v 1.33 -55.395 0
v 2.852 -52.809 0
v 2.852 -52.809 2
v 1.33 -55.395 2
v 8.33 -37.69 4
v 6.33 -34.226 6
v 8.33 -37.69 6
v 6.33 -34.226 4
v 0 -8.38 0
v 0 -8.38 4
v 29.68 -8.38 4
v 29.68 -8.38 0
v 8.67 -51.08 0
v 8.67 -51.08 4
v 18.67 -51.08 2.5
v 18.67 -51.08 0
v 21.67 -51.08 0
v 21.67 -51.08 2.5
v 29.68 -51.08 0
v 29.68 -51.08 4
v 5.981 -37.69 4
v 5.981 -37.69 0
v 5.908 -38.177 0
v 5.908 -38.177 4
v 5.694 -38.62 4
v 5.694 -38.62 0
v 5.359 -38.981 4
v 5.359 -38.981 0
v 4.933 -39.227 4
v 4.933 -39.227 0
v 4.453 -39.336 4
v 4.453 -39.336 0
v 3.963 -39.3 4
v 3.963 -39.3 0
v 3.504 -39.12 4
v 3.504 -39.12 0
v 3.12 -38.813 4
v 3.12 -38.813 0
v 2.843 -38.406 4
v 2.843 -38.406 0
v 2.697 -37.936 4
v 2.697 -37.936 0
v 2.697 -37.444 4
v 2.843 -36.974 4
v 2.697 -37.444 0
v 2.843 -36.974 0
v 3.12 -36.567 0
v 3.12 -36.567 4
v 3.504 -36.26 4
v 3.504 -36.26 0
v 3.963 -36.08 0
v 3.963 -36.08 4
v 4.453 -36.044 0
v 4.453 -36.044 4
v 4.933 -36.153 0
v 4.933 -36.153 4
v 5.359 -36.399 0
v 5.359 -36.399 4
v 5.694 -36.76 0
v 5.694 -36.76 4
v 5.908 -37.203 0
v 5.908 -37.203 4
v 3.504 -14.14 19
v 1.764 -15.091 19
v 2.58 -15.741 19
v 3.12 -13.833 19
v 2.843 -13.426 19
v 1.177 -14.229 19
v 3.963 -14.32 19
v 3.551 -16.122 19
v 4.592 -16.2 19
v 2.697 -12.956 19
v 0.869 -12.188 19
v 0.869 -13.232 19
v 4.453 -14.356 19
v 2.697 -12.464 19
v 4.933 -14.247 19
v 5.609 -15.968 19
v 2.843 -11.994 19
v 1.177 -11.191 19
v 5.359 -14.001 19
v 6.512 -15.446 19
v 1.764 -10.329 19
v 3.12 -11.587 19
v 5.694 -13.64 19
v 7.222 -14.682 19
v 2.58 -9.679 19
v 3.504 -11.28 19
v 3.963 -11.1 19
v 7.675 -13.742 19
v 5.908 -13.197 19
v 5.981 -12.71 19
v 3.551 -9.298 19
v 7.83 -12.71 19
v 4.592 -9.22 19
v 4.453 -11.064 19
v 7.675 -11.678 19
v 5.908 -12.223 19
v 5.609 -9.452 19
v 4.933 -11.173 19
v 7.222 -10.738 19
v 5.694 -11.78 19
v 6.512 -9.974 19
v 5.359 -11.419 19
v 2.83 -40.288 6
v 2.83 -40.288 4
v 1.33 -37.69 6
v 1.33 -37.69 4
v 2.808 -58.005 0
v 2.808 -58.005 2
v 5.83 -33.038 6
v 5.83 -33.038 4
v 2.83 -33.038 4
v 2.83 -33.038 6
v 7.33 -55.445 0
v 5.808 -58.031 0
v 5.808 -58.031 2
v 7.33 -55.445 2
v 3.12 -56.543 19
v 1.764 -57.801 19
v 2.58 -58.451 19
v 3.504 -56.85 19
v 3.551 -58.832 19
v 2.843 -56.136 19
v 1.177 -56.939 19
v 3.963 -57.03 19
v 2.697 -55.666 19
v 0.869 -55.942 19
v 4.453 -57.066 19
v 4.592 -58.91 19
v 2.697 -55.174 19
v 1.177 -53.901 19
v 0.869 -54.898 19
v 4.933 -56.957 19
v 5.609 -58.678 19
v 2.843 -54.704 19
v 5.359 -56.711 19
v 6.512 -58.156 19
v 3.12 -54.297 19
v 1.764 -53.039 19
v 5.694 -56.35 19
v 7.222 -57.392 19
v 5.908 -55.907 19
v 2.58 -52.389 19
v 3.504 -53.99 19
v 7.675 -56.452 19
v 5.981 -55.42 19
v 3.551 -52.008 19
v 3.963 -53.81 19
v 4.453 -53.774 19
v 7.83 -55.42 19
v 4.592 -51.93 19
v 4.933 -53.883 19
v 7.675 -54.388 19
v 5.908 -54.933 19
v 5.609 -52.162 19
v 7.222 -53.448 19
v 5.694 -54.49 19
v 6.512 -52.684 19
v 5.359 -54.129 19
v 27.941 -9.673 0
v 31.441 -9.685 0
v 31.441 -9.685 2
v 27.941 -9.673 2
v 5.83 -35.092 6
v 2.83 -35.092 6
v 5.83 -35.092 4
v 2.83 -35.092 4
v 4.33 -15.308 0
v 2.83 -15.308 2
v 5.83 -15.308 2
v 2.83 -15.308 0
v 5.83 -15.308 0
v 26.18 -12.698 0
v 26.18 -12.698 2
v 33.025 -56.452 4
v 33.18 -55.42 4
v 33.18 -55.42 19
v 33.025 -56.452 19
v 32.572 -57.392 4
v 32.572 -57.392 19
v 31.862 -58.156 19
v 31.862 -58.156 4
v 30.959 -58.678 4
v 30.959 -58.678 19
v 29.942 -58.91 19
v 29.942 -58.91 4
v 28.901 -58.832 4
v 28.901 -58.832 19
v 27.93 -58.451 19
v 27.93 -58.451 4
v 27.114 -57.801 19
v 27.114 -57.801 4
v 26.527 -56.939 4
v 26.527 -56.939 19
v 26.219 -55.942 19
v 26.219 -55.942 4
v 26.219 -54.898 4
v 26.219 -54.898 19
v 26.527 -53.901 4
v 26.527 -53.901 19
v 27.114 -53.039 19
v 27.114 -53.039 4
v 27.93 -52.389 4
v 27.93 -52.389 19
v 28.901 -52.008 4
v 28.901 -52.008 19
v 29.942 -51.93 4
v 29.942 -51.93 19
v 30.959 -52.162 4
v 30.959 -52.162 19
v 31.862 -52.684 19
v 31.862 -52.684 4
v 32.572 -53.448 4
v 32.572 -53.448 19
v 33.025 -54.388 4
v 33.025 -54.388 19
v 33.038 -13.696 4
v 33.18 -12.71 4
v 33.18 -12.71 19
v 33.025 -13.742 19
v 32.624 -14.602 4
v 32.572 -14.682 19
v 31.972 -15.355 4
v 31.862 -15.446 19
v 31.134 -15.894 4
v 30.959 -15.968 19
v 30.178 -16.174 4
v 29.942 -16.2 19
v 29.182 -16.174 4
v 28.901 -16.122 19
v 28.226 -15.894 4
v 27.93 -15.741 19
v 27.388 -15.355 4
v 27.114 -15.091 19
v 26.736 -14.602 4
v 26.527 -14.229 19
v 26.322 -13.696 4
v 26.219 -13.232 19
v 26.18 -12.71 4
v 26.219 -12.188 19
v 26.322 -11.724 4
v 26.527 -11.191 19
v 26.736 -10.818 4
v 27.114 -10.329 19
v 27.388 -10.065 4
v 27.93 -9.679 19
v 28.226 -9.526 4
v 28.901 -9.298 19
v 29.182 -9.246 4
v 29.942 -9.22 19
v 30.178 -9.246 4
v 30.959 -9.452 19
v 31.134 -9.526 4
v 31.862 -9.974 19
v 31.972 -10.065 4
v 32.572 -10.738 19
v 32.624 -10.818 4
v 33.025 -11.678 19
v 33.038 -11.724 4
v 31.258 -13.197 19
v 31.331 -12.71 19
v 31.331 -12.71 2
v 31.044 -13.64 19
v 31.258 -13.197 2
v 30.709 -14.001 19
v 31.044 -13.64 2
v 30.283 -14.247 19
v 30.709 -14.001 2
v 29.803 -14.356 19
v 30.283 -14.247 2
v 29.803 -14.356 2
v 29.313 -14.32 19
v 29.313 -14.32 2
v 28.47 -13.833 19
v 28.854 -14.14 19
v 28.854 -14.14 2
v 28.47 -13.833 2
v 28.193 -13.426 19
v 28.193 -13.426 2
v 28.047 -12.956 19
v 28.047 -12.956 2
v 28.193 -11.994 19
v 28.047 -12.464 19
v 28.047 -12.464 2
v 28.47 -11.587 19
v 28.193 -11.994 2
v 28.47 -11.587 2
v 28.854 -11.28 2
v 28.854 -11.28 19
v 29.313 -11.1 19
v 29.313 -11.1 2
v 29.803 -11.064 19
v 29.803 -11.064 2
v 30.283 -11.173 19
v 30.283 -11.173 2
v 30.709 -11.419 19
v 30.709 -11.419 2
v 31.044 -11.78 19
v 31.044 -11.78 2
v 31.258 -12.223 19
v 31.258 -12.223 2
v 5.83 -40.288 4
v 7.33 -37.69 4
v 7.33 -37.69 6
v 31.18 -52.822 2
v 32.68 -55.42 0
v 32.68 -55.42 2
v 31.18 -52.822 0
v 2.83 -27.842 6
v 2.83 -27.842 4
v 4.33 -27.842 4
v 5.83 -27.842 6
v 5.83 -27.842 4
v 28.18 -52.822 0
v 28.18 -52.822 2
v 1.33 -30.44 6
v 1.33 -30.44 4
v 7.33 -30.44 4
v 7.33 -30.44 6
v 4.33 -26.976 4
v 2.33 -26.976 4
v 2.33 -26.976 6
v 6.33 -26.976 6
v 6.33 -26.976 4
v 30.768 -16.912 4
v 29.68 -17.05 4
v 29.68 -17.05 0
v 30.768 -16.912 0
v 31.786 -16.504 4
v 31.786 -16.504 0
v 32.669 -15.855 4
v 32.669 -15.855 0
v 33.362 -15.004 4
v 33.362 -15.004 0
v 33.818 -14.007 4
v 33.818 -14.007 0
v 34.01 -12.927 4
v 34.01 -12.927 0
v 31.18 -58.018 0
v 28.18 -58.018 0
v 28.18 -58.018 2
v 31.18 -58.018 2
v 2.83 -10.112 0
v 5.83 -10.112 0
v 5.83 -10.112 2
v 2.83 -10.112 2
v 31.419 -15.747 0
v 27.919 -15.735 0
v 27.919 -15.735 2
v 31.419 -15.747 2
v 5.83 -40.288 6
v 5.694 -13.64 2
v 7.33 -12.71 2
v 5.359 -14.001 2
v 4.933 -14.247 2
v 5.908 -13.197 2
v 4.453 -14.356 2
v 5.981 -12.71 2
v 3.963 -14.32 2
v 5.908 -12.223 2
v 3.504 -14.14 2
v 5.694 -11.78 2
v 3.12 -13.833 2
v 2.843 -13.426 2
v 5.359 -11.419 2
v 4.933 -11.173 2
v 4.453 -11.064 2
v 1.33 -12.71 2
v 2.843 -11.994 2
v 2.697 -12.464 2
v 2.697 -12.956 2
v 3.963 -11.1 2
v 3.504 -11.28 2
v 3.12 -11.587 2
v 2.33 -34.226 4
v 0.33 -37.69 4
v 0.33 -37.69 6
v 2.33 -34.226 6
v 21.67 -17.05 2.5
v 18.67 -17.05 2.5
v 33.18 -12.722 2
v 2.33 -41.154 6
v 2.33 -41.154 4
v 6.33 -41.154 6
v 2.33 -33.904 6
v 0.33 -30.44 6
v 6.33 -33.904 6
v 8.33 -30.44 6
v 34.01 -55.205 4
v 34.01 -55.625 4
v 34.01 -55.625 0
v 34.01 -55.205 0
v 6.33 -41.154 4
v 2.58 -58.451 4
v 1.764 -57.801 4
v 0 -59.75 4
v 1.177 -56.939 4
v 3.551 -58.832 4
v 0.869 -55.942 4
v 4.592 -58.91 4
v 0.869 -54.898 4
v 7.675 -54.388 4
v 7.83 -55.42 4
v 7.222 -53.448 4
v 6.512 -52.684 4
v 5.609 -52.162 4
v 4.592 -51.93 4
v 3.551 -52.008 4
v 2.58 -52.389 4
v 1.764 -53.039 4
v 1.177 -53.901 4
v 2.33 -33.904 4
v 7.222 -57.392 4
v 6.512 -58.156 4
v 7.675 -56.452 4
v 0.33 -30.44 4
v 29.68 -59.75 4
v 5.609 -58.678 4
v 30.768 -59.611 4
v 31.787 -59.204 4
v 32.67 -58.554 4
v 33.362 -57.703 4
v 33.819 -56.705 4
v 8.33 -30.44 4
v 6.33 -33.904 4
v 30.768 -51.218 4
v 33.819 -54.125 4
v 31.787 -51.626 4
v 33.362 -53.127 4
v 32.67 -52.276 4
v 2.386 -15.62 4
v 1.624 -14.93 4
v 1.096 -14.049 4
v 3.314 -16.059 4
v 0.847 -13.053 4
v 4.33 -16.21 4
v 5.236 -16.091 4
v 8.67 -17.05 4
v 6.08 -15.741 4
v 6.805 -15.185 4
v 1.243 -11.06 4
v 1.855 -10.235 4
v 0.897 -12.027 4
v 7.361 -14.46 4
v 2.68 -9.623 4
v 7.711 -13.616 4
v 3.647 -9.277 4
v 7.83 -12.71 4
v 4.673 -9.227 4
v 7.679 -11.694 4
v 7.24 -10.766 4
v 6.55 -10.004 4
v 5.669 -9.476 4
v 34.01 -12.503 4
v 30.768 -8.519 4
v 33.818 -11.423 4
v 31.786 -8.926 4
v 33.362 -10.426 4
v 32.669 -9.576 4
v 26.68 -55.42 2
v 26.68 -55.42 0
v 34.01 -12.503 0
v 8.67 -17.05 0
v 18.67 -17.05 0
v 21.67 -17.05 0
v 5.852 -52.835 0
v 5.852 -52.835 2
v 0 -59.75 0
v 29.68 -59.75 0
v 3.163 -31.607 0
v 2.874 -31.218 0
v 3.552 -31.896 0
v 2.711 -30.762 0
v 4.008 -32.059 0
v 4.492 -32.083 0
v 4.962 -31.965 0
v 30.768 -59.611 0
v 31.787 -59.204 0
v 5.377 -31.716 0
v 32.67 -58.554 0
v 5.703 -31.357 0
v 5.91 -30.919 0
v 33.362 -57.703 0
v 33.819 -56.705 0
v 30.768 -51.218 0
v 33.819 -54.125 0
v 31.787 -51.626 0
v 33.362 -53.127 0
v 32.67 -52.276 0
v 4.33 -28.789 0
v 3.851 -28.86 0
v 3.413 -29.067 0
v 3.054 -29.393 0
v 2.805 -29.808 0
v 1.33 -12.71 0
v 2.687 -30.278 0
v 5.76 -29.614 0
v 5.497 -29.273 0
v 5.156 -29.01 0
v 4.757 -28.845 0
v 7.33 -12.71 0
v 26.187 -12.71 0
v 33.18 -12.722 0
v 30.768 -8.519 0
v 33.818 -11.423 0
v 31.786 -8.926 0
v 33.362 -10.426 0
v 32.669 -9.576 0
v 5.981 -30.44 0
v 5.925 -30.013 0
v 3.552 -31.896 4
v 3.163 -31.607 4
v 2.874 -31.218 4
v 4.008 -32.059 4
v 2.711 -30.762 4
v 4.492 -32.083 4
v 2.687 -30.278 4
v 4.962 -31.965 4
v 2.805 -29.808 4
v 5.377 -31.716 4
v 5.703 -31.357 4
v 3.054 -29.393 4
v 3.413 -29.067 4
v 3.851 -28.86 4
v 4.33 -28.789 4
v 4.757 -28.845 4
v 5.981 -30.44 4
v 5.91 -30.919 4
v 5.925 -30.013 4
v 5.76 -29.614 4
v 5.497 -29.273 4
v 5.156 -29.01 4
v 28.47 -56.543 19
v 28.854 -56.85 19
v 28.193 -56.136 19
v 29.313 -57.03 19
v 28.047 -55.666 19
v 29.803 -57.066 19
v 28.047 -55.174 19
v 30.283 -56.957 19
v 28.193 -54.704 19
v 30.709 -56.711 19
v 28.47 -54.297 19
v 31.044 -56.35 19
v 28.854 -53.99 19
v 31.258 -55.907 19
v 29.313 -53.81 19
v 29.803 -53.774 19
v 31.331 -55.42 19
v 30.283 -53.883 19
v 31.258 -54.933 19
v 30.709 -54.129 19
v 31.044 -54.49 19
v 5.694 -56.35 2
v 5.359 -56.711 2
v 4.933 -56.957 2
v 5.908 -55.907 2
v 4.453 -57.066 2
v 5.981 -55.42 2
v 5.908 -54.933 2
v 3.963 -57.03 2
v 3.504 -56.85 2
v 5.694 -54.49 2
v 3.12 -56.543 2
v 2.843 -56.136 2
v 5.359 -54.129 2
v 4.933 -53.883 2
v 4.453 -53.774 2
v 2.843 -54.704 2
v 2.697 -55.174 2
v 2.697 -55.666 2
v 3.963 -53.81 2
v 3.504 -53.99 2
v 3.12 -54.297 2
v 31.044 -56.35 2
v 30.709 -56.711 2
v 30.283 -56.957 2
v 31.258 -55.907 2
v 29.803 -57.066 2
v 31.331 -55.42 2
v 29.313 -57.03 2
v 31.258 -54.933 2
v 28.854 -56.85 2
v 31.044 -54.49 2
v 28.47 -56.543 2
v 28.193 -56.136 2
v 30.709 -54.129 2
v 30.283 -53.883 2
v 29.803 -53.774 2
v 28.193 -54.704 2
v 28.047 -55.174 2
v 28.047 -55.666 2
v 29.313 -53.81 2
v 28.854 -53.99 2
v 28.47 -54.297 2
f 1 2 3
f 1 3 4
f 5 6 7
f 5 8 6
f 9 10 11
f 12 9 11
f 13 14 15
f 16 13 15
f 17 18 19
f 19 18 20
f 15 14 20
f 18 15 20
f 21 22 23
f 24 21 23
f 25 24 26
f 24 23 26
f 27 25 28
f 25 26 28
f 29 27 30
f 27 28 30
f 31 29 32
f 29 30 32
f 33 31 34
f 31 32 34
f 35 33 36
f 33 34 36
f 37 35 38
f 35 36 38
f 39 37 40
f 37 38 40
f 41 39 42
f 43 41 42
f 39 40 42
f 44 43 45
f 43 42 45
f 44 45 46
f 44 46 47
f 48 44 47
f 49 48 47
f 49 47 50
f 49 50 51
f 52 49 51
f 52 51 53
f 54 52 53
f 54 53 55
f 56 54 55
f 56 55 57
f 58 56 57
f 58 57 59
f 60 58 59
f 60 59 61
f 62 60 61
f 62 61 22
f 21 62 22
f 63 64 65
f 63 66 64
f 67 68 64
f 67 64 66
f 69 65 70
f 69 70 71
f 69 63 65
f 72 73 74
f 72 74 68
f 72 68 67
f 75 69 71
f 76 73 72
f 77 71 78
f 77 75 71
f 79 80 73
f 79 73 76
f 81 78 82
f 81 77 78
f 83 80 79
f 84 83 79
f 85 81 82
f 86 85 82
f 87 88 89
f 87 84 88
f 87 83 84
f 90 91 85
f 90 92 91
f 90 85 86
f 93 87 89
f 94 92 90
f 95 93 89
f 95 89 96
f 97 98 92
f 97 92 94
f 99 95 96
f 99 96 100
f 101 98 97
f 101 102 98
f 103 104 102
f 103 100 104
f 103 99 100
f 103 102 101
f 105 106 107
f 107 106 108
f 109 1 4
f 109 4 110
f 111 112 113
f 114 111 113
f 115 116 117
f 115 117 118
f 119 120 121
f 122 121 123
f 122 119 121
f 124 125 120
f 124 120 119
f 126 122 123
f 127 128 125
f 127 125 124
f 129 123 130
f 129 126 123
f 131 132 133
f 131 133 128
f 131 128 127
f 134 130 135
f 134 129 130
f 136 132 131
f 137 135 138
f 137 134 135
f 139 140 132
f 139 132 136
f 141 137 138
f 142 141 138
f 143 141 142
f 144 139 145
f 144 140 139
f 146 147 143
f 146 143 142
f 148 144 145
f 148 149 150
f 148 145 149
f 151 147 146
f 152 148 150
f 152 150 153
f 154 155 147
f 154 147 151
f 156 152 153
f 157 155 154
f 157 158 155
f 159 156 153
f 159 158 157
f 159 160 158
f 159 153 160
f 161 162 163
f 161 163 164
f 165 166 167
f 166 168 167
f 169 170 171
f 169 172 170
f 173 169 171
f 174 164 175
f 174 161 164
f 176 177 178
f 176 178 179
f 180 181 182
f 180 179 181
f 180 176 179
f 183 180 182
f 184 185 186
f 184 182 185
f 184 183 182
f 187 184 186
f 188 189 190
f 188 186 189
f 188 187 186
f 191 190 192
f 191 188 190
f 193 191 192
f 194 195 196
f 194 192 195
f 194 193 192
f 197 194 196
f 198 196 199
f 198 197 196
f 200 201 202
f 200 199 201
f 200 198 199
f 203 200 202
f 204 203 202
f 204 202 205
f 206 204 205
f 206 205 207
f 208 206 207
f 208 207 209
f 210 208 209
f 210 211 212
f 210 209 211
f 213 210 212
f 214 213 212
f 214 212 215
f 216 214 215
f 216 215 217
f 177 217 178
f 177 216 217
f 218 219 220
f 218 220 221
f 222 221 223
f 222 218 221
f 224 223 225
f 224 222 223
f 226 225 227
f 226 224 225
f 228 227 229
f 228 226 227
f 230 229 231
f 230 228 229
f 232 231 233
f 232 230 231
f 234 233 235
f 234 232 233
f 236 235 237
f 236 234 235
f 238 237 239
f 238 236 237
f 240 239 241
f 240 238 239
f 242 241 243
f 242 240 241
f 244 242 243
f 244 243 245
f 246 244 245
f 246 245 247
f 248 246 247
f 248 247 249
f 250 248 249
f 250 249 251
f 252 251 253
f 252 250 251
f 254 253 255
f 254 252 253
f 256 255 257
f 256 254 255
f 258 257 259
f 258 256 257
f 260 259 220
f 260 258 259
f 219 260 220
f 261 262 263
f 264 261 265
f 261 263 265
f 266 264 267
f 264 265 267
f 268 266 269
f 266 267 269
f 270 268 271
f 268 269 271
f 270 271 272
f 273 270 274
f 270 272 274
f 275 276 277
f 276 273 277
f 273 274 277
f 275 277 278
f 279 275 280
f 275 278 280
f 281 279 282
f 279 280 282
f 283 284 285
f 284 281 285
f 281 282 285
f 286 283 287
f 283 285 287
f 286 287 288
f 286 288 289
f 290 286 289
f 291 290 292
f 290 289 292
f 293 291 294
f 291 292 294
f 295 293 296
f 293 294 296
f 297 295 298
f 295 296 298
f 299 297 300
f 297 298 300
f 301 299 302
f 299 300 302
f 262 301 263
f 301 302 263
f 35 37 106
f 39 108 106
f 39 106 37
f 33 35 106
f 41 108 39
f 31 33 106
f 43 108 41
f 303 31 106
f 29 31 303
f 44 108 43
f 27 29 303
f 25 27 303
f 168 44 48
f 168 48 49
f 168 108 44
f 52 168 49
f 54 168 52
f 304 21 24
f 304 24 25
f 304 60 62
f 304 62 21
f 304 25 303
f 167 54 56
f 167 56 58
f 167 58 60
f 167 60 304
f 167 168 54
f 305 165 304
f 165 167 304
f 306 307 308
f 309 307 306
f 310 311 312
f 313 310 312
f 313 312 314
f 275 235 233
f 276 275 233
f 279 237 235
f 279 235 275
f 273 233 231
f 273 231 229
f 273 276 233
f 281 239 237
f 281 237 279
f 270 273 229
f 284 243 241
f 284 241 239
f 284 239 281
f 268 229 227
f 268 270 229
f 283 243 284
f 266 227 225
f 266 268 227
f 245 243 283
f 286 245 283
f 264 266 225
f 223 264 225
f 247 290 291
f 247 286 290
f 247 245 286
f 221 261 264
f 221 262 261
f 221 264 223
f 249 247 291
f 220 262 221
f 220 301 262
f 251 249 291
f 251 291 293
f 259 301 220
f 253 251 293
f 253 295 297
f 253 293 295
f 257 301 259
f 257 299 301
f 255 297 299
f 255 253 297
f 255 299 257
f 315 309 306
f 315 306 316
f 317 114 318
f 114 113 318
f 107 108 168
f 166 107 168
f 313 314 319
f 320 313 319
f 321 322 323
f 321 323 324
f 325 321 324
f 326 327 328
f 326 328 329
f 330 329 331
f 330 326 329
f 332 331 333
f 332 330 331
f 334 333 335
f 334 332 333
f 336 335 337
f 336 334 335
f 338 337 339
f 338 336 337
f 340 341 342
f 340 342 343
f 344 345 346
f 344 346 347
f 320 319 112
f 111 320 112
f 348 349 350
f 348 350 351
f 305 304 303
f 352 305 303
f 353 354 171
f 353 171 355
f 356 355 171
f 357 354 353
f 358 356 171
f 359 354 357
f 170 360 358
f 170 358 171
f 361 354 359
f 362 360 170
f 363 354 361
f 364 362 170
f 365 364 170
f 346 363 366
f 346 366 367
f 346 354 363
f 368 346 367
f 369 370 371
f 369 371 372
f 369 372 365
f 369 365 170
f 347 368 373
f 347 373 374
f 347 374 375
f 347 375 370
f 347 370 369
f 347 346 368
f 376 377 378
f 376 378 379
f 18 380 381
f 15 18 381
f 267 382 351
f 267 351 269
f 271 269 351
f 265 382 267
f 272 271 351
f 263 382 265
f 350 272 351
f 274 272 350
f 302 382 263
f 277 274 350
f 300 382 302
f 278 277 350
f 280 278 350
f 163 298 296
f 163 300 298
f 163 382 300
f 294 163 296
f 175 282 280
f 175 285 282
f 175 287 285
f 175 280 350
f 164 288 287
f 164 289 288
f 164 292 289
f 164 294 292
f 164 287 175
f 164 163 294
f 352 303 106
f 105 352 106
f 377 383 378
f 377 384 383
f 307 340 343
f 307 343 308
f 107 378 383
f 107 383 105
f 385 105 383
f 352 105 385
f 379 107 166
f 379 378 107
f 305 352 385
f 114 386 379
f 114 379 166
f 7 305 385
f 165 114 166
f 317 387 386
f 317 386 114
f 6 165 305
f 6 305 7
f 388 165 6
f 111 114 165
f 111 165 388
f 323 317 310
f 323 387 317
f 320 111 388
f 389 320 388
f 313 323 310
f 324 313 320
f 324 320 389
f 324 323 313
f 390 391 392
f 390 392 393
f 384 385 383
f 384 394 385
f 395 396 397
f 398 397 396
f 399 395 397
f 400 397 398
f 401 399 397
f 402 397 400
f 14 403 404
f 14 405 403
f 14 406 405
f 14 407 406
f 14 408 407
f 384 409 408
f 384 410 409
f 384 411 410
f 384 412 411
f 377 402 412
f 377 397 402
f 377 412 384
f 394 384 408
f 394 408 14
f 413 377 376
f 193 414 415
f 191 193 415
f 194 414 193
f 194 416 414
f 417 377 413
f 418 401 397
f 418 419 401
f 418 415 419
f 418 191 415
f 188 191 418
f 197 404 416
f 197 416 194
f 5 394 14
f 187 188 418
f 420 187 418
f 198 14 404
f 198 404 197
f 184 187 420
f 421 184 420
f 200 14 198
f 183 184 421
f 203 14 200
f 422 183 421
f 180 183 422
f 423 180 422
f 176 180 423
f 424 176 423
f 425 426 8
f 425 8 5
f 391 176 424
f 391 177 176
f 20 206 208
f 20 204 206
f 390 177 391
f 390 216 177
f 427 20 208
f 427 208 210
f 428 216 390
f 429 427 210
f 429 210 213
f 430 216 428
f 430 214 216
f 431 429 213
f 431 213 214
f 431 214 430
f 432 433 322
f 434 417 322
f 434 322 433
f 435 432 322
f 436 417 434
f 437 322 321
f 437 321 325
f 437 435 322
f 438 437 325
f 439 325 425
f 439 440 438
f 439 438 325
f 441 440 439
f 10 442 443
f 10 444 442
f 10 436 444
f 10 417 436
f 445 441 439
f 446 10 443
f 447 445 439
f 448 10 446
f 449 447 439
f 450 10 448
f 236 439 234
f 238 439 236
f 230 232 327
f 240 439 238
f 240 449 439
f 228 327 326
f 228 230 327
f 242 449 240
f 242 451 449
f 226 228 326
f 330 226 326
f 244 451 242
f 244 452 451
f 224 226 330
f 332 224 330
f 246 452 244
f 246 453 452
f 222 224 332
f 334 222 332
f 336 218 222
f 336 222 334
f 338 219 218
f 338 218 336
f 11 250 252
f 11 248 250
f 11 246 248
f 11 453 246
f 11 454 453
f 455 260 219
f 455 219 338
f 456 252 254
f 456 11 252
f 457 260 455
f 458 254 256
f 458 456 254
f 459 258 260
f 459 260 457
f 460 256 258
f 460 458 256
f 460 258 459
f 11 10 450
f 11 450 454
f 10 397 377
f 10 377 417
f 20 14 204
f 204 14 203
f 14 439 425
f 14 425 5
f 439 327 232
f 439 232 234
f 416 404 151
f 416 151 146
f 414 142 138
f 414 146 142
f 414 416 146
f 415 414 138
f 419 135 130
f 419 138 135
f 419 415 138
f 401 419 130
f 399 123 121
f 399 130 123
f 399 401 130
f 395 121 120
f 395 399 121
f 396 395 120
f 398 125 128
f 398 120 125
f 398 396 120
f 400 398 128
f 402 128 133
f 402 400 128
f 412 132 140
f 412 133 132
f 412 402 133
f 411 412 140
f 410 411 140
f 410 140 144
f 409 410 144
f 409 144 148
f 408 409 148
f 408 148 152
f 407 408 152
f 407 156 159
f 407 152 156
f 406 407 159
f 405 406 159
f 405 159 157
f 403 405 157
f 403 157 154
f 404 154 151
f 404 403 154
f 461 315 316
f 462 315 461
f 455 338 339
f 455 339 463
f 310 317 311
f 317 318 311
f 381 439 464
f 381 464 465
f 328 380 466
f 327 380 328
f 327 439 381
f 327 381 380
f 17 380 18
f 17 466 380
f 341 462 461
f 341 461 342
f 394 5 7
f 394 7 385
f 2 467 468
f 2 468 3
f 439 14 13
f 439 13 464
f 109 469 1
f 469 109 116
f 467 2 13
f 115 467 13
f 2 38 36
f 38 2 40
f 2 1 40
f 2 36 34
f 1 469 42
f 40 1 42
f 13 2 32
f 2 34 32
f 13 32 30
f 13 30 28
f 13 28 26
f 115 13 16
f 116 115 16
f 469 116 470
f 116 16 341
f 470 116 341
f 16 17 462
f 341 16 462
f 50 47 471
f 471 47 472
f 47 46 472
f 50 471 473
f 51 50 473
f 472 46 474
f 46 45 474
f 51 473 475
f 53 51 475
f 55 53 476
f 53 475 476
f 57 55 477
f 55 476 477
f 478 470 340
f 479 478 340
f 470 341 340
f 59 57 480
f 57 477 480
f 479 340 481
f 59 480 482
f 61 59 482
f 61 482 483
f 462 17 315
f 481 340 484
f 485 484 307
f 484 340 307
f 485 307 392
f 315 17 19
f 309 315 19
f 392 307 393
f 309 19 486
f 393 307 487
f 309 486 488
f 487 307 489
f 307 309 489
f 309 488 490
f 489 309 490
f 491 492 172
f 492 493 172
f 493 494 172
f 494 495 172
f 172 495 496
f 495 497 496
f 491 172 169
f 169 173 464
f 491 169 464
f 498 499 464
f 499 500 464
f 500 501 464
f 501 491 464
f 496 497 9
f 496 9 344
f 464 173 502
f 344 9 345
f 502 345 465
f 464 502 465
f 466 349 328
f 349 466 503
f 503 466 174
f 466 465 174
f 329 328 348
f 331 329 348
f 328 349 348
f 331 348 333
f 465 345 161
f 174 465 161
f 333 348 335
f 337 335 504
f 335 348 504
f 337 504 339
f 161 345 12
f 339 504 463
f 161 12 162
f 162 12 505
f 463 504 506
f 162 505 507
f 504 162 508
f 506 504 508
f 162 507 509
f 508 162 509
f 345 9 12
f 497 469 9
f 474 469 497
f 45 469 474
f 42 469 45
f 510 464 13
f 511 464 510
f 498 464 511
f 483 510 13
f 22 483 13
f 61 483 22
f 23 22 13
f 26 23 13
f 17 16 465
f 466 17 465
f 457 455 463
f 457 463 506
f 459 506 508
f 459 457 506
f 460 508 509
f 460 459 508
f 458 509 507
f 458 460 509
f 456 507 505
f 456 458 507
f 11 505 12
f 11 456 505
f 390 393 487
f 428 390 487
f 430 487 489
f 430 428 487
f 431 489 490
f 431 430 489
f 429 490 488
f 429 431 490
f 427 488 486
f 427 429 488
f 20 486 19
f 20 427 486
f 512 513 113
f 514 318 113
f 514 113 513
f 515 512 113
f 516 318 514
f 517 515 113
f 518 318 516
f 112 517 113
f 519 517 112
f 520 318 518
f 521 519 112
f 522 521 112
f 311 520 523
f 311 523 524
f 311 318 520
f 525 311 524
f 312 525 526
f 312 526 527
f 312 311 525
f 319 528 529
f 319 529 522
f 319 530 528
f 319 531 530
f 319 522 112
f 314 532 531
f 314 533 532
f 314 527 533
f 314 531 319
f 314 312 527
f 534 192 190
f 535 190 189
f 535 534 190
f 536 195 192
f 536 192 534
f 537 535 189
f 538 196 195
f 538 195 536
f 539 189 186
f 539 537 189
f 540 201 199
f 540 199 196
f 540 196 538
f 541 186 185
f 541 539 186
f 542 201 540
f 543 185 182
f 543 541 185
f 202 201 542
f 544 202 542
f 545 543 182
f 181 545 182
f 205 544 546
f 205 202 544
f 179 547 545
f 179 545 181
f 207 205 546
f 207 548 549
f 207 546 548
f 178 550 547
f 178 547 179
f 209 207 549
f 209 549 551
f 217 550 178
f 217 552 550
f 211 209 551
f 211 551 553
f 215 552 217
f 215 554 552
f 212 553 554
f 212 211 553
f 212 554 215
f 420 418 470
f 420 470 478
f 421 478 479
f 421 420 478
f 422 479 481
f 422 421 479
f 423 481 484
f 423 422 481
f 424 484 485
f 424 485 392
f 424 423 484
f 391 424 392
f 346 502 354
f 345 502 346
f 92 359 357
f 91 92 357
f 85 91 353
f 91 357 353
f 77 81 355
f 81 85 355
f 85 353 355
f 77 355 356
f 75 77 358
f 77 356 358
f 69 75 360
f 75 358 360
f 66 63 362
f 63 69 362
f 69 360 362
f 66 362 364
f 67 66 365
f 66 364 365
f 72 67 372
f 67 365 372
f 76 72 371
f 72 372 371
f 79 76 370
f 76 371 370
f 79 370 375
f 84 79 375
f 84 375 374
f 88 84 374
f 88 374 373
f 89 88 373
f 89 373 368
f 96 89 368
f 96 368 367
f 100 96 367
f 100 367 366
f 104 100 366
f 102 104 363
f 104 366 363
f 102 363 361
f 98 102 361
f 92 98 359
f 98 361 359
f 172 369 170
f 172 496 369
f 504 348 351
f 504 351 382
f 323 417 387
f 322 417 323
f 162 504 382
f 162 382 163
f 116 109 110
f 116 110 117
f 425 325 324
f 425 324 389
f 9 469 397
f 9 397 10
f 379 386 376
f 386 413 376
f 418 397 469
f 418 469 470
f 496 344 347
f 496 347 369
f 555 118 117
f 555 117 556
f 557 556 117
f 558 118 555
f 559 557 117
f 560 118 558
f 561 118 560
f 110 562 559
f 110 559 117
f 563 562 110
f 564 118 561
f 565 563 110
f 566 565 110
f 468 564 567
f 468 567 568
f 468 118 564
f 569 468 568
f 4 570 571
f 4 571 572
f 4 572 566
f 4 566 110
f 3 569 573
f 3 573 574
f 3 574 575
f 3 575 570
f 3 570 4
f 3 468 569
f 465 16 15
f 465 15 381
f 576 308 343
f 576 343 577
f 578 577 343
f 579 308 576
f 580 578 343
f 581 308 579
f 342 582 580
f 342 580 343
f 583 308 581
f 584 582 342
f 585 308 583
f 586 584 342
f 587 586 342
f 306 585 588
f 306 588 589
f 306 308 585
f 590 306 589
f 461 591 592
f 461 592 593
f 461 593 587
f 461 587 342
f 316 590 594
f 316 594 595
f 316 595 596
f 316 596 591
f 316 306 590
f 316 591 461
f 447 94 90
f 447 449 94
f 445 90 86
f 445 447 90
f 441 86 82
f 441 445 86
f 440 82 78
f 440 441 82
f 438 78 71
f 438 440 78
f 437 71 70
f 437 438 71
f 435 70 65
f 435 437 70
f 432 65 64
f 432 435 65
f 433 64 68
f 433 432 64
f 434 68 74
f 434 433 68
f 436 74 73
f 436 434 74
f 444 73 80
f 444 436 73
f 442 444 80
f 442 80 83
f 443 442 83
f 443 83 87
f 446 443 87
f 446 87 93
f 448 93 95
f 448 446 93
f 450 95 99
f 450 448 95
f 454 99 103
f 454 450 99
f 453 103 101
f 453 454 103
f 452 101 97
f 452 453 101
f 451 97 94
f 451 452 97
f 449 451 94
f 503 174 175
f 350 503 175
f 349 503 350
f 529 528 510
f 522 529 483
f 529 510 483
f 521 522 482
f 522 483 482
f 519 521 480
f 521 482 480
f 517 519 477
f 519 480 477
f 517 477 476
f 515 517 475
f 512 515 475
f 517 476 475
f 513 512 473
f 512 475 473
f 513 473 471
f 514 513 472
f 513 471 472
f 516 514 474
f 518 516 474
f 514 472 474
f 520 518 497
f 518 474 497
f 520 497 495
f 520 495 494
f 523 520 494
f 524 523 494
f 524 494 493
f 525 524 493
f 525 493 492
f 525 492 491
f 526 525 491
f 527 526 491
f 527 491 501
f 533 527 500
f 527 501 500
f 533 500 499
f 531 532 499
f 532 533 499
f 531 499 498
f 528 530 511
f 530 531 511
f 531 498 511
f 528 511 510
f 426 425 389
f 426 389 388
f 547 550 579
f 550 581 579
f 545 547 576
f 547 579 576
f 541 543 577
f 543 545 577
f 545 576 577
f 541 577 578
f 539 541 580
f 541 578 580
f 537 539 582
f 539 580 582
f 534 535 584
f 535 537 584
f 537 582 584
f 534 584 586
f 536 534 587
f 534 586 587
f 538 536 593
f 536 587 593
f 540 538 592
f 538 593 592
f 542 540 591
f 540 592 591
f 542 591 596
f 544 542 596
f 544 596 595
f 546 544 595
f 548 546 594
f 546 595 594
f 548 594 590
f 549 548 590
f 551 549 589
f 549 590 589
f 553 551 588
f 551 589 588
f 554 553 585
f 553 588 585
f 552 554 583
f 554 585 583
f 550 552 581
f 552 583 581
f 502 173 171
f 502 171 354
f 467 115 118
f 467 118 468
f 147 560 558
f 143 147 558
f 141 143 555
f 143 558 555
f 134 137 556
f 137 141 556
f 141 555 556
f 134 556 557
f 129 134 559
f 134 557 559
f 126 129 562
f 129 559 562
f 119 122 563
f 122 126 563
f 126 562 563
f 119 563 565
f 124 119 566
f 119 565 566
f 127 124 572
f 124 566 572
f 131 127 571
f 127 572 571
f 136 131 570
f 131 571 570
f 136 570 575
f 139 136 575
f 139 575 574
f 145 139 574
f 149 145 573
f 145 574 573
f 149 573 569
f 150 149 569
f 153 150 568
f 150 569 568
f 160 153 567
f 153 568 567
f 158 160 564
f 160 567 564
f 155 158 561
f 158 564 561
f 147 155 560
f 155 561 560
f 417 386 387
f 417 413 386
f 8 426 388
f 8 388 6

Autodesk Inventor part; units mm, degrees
ref_plane "YZ Plane" through (0, 0, 0) normal (1, 0, 0) x (0, 1, 0)
ref_plane "XZ Plane" through (0, 0, 0) normal (0, 1, 0) x (-1, 0, 0)
ref_plane "XY Plane" through (0, 0, 0) normal (0, 0, 1) x (1, 0, 0)
sketch "Sketch1" plane through (0, 0, 0) normal (0, 0, 1) x (1, 0, 0)
  line L0 (0, 0) -> (41.5, 0)
  line L1 (41.5, 0) -> (41.5, -73)
  line L2 (41.5, -73) -> (0, -73)
  line L3 (0, -73) -> (0, 0)
  line L4 (0, -73) -> (3.11, -73)
  line L5 (0, -73) -> (3.11, -73) construction
  line L6 (3.11, -73) -> (3.11, -69.85)
  line L7 (3.11, -73) -> (6.26, -73) construction
  line L8 (3.11, -69.85) -> (14.54, -69.85)
  line L9 (14.54, -69.85) -> (19.65, -69.85)
  line L10 (19.65, -69.85) -> (31.08, -69.85)
  circle A0 centre (3.11, -69.85) radius 1.6
  circle A1 centre (14.54, -69.85) radius 1.6
  circle A2 centre (19.65, -69.85) radius 1.6
  circle A3 centre (31.08, -69.85) radius 1.6
  line L11 (3.11, -69.85) -> (3.11, -55.42)
  line L12 (3.11, -69.85) -> (17.54, -69.85) construction
  line L13 (0, -73) -> (4.33, -73)
  line L14 (0, -73) -> (4.33, -73) construction
  line L15 (4.33, -73) -> (4.33, -53.49)
  line L16 (3.11, -55.42) -> (6.6479, -55.42)
  circle A4 centre (4.33, -55.42) radius 1.651
  line L17 (4.33, -55.42) -> (4.33, -37.69)
  line L18 (4.33, -55.42) -> (22.06, -55.42) construction
  line L19 (4.33, -55.42) -> (29.68, -55.42)
  line L20 (4.33, -55.42) -> (29.68, -55.42) construction
  circle A5 centre (4.33, -37.69) radius 1.651
  circle A6 centre (29.68, -55.42) radius 1.651
  line L21 (4.33, -37.69) -> (39.0376, -37.69)
  line L22 (29.68, -55.42) -> (29.68, -25.3245)
  circle A7 centre (29.68, -37.69) radius 1.651
  line L23 (4.33, -37.69) -> (4.33, -30.44)
  line L24 (4.33, -37.69) -> (11.58, -37.69) construction
  line L25 (4.33, -30.44) -> (4.33, -12.71)
  line L26 (4.33, -30.44) -> (29.68, -30.44)
  line L27 (4.33, -30.44) -> (29.68, -30.44) construction
  line L28 (4.33, -12.71) -> (29.68, -12.71)
  circle A8 centre (29.68, -12.71) radius 1.651
  circle A9 centre (4.33, -12.71) radius 1.651
  circle A10 centre (4.33, -30.44) radius 1.651
  circle A11 centre (29.68, -30.44) radius 1.651
  line L29 (29.68, -12.71) -> (29.68, -11.3536)
  dimension "d0" = 41.5
  dimension "d1" = 73
  dimension "d2" = 3.11
  dimension "d3" = 0
  dimension "d4" = 3.15
  dimension "d5" = 90
  dimension "d6" = 11.43
  dimension "d7" = 90
  dimension "d9" = 5.11
  dimension "d10" = 11.43
  dimension "d11" = 180
  dimension "d12" = 3.2
  dimension "d13" = 3.2
  dimension "d14" = 3.2
  dimension "d15" = 3.2
  dimension "d18" = 14.43
  dimension "d19" = 90
  dimension "d20" = 4.33
  dimension "d21" = 0
  dimension "d22" = 3.302
  dimension "d23" = 17.73
  dimension "d24" = 90
  dimension "d25" = 25.35
  dimension "d26" = 0
  dimension "d27" = 3.302
  dimension "d28" = 3.302
  dimension "d29" = 3.302
  dimension "d30" = 7.25
  dimension "d31" = 90
  dimension "d32" = 17.73
  dimension "d33" = 180
  dimension "d34" = 25.35
  dimension "d35" = 0
  dimension "d36" = 25.35
  dimension "d37" = 3.302
  dimension "d38" = 3.302
  dimension "d39" = 3.302
  dimension "d40" = 3.302
extrude "Extrusion2" add sketch "Sketch1" along normal blind 4 contours L0 L1 L2 L15 A0 A4 L16 L19 A6 L22 A7 A11 L26 A10 L23 A5 L17 L11 L6 L3 | L6 A0 L15 L2 | L11 A4 L15 A0 | L15 L17 A5 L21 A7 L22 A6 L19 L16 A4 | L23 A10 L26 A11 L22 A7 L21 A5
sketch "Sketch3" plane through (0, 0, 4) normal (0, 0, 1) x (1, 0, 0)
  circle A0 centre (4.33, -55.42) radius 1.651 projected
  circle A1 centre (4.33, -55.42) radius 3.5
  circle A2 centre (29.68, -55.42) radius 1.651 projected
  circle A3 centre (29.68, -55.42) radius 3.5
  circle A4 centre (4.33, -12.71) radius 1.651 projected
  circle A5 centre (4.33, -12.71) radius 3.5
  circle A6 centre (29.68, -12.71) radius 1.651 projected
  circle A7 centre (29.68, -12.71) radius 3.5
  point P0 (0, 0)
  dimension "d46" = 7
  dimension "d47" = 7
  dimension "d48" = 7
  dimension "d49" = 7
extrude "Extrusion4" add sketch "Sketch3" along normal blind 15
sketch "Sketch8" plane through (0, 0, 0) normal (0, 0, -1) x (-1, 0, 0)
  circle A0 centre (-4.33, -12.71) radius 1.651 projected
  circle A1 centre (-4.33, -12.71) radius 3
  circle A2 centre (-29.68, -12.71) radius 1.651 projected
  circle A3 centre (-29.68, -12.71) radius 3
  circle A4 centre (-29.68, -55.42) radius 1.651 projected
  circle A5 centre (-29.68, -55.42) radius 3
  circle A6 centre (-4.33, -55.42) radius 1.651 projected
  circle A7 centre (-4.33, -55.42) radius 3
  line L0 (-1.33, -12.71) -> (-2.83, -15.3081)
  line L1 (-2.83, -15.3081) -> (-5.83, -15.3081)
  line L2 (-5.83, -15.3081) -> (-7.33, -12.71)
  line L3 (-7.33, -12.71) -> (-5.83, -10.1119)
  line L4 (-5.83, -10.1119) -> (-2.83, -10.1119)
  line L5 (-2.83, -10.1119) -> (-1.33, -12.71)
  circle A8 centre (-29.68, -12.71) radius 3.5 projected
  line L6 (-26.18, -12.6978) -> (-27.9194, -15.735)
  line L7 (-27.9194, -15.735) -> (-31.4194, -15.7472)
  line L8 (-31.4194, -15.7472) -> (-33.18, -12.7222)
  line L9 (-33.18, -12.7222) -> (-31.4406, -9.685)
  line L10 (-31.4406, -9.685) -> (-27.9406, -9.6728)
  line L11 (-27.9406, -9.6728) -> (-26.18, -12.6978)
  line L12 (-26.68, -55.42) -> (-28.18, -58.0181)
  line L13 (-28.18, -58.0181) -> (-31.18, -58.0181)
  line L14 (-31.18, -58.0181) -> (-32.68, -55.42)
  line L15 (-32.68, -55.42) -> (-31.18, -52.8219)
  line L16 (-31.18, -52.8219) -> (-28.18, -52.8219)
  line L17 (-28.18, -52.8219) -> (-26.68, -55.42)
  line L18 (-1.3301, -55.3946) -> (-2.808, -58.0053)
  line L19 (-2.808, -58.0053) -> (-5.8079, -58.0307)
  line L20 (-5.8079, -58.0307) -> (-7.3299, -55.4454)
  line L21 (-7.3299, -55.4454) -> (-5.852, -52.8347)
  line L22 (-5.852, -52.8347) -> (-2.8521, -52.8093)
  line L23 (-2.8521, -52.8093) -> (-1.3301, -55.3946)
  point P0 (0, 0)
  dimension "d53" = 6
  dimension "d55" = 6
  dimension "d56" = 6
  dimension "d54" = 6
extrude "Extrusion5" cut sketch "Sketch8" against normal blind 2 contours L0 L1 L2 L3 L4 L5 | A2 | A3 | L12 L13 L14 L15 L16 L17 | L18 L19 L20 L21 L22 L23 | L6 L7 L8 L9 L10 L11
sketch "Sketch9" plane through (0, 0, 4) normal (0, 0, 1) x (1, 0, 0)
  circle A0 centre (4.33, -30.44) radius 1.651 projected
  circle A1 centre (4.33, -30.44) radius 1.651
  circle A2 centre (4.33, -37.69) radius 1.651 projected
  circle A3 centre (4.33, -37.69) radius 1.651
  line L0 (7.33, -30.44) -> (5.83, -33.0381)
  line L1 (5.83, -33.0381) -> (2.83, -33.0381)
  line L2 (2.83, -33.0381) -> (1.33, -30.44)
  line L3 (1.33, -30.44) -> (2.83, -27.8419)
  line L4 (2.83, -27.8419) -> (5.83, -27.8419)
  line L5 (5.83, -27.8419) -> (7.33, -30.44)
  line L6 (7.33, -37.69) -> (5.83, -40.2881)
  line L7 (5.83, -40.2881) -> (2.83, -40.2881)
  line L8 (2.83, -40.2881) -> (1.33, -37.69)
  line L9 (1.33, -37.69) -> (2.83, -35.0919)
  line L10 (2.83, -35.0919) -> (5.83, -35.0919)
  line L11 (5.83, -35.0919) -> (7.33, -37.69)
  line L12 (8.33, -30.44) -> (6.33, -33.9041)
  line L13 (6.33, -33.9041) -> (2.33, -33.9041)
  line L14 (2.33, -33.9041) -> (0.33, -30.44)
  line L15 (0.33, -30.44) -> (2.33, -26.9759)
  line L16 (2.33, -26.9759) -> (6.33, -26.9759)
  line L17 (6.33, -26.9759) -> (8.33, -30.44)
  line L18 (8.33, -37.69) -> (6.33, -41.1541)
  line L19 (6.33, -41.1541) -> (2.33, -41.1541)
  line L20 (2.33, -41.1541) -> (0.33, -37.69)
  line L21 (0.33, -37.69) -> (2.33, -34.2259)
  line L22 (2.33, -34.2259) -> (6.33, -34.2259)
  line L23 (6.33, -34.2259) -> (8.33, -37.69)
  line L24 (6.33, -33.9041) -> (6.33, -34.2259)
  line L25 (2.33, -33.9041) -> (2.33, -34.2259)
  point P0 (0, 0)
  dimension "d59" = 3.302
  dimension "d60" = 3.302
extrude "Extrusion6" add sketch "Sketch9" along normal blind 2 contours L12 L13 L14 L15 L16 L17 | L24 L22 L25 L13 | L23 L18 L19 L20 L21 L22
sketch "Sketch10" plane through (0, 0, 0) normal (0, 0, -1) x (-1, 0, 0)
  circle A0 centre (-4.33, -55.42) radius 1.651 projected
  circle A1 centre (-4.33, -12.71) radius 3.5 projected
  circle A2 centre (-4.33, -12.71) radius 4.33
  line L0 (-4.33, -8.38) -> (6.0992, -8.38)
  line L1 (-4.33, -8.38) -> (-46.273, -8.38)
  circle A3 centre (-29.68, -55.42) radius 1.651 projected
  circle A4 centre (-29.68, -12.71) radius 1.651 projected
  circle A5 centre (-29.68, -12.71) radius 4.33
  line L2 (-34.01, -12.71) -> (-34.01, 23.2585)
  circle A6 centre (-4.33, -55.42) radius 4.33
  line L3 (-34.01, -12.71) -> (-34.01, -66.3278)
  line L4 (-4.33, -59.75) -> (-38.3543, -59.75)
  circle A7 centre (-29.68, -55.42) radius 4.33
  line L5 (-29.68, -55.42) -> (-29.68, -12.71)
  circle A8 centre (-4.33, -12.71) radius 1.651 projected
  line L6 (-4.33, -12.71) -> (-29.68, -12.71)
  line L7 (-18.2288, -59.75) -> (-46.273, -59.75)
  line L8 (-46.273, -59.75) -> (-46.273, -78.0952)
  line L9 (-46.273, -78.0952) -> (-18.2288, -78.0952)
  line L10 (-18.2288, -78.0952) -> (-18.2288, -59.75)
  line L11 (-18.2288, -59.75) -> (2.2846, -59.75)
  line L12 (2.2846, -59.75) -> (2.2846, -79.2844)
  line L13 (2.2846, -79.2844) -> (-18.2288, -79.2844)
  line L14 (-18.2288, -79.2844) -> (-18.2288, -59.75)
  line L15 (-34.01, -59.75) -> (-49.3705, -59.75)
  line L16 (-49.3705, -59.75) -> (-49.3705, 18.5259)
  line L17 (-49.3705, 18.5259) -> (-34.01, 18.5259)
  line L18 (-34.01, 18.5259) -> (-34.01, -59.75)
  line L19 (-34.01, -8.38) -> (8.0076, -8.38)
  line L20 (8.0076, -8.38) -> (8.0076, 15.8503)
  line L21 (8.0076, 15.8503) -> (-34.01, 15.8503)
  line L22 (-34.01, 15.8503) -> (-34.01, -8.38)
  point P0 (0, 0)
extrude "Extrusion7" cut sketch "Sketch10" along normal mid plane 100 contours L1 L2 L21 L20 L19 L0 | L2 L3 L4 L7 L15 L16 L17 | L4 L10 L9 L8 L7 | L4 L11 L12 L13 L14 L10
sketch "Sketch11" plane through (0, 0, 0) normal (0, 0, -1) x (-1, 0, 0)
  line L0 (-34.01, -59.75) -> (0, -59.75) projected
  line L1 (0, -8.38) -> (-34.01, -8.38) projected
  circle A0 centre (-4.33, -55.42) radius 1.651 projected
  circle A1 centre (-4.33, -55.42) radius 4.3403
  circle A2 centre (-4.33, -12.71) radius 1.651 projected
  circle A3 centre (-4.33, -12.71) radius 4.3403
  line L2 (-4.3352, -51.0797) -> (-29.68, -51.0797)
  line L3 (-29.68, -59.75) -> (-4.3352, -59.75)
  line L4 (-4.3352, -59.75) -> (-4.3352, -51.0797)
  line L5 (-4.3352, -17.0503) -> (-29.68, -17.0503)
  line L6 (-29.68, -8.38) -> (-4.3352, -8.38)
  line L7 (-4.3352, -8.38) -> (-4.3352, -17.0503)
  line L8 (-4.3352, -51.0797) -> (-8.6703, -51.0797)
  line L9 (-8.6703, -51.0797) -> (-8.6703, -12.7152)
  line L10 (-8.6703, -12.7152) -> (-4.3352, -12.7152)
  line L11 (-4.3352, -12.7152) -> (-4.3352, -51.0797)
  line L12 (-34.01, -8.38) -> (-34.01, -59.75) projected
  line L13 (-8.6703, -17.0503) -> (-34.01, -17.0503)
  line L14 (-34.01, -17.0503) -> (-34.01, -51.0797)
  line L15 (-34.01, -51.0797) -> (-8.6703, -51.0797)
  line L16 (-8.6703, -51.0797) -> (-8.6703, -17.0503)
  line L17 (-29.68, -59.75) -> (-36.7019, -59.75)
  line L18 (-36.7019, -59.75) -> (-36.7019, -51.0797)
  line L19 (-36.7019, -51.0797) -> (-29.68, -51.0797)
  line L20 (-29.68, -17.0503) -> (-34.01, -17.0503)
  line L21 (-34.01, -17.0503) -> (-34.01, -8.38)
  line L22 (-34.01, -8.38) -> (-29.68, -8.38)
  arc A4 (-29.68, -51.0797) -> (-29.68, -59.75) centre (-29.68, -55.4148) ccw
  arc A5 (-29.68, -8.38) -> (-29.68, -17.0503) centre (-29.68, -12.7152) ccw
  line L23 (-29.68, -17.0503) -> (-40.5173, -17.0503)
  line L24 (-40.5173, -17.0503) -> (-40.5173, -8.38)
  line L25 (-40.5173, -8.38) -> (-29.68, -8.38)
  line L26 (-8.6703, -51.0797) -> (-41.5169, -51.0797)
  line L27 (-41.5169, -51.0797) -> (-41.5169, -17.0503)
  line L28 (-41.5169, -17.0503) -> (-8.6703, -17.0503)
  line L29 (-8.6703, -17.0503) -> (-8.6703, -51.0797)
  arc A6 (-29.68, -8.38) -> (-29.68, -17.0503) centre (-29.68, -12.7152) ccw
  line L30 (-29.68, -8.38) -> (-34.01, -8.38)
  point P0 (0, 0)
  point P1 (-29.68, -55.42)
extrude "Extrusion8" cut sketch "Sketch11" along normal mid plane 100 contours L12 A4 L0 | L17 L18 L19 L12 A4 | L12 L15 A4 | L12 L13 L5 L9 L2 L15 | L23 L24 L25 L12 A5 | L12 A5 L13 | L12 L1 A5
sketch "Sketch12" plane through (0, 0, 0) normal (0, 0, -1) x (-1, 0, 0)
  line L0 (-29.68, -51.0797) -> (-8.6703, -51.0797) projected
  line L1 (-8.6703, -17.0503) -> (-29.68, -17.0503) projected
  line L2 (-8.6703, -51.0797) -> (-18.6703, -51.0797)
  line L3 (-18.6703, -51.0797) -> (-18.6703, -17.0503)
  line L4 (-18.6703, -17.0503) -> (-8.6703, -17.0503)
  line L5 (-8.6703, -17.0503) -> (-8.6703, -51.0797)
  line L6 (-18.6703, -17.0503) -> (-21.6703, -17.0503)
  line L7 (-21.6703, -17.0503) -> (-21.6703, -51.0797)
  line L8 (-21.6703, -51.0797) -> (-18.6703, -51.0797)
  line L9 (-18.6703, -51.0797) -> (-18.6703, -17.0503)
  point P0 (0, 0)
  dimension "d71" = 10
  dimension "d72" = 3
extrude "Extrusion9" add sketch "Sketch12" against normal blind 2.5 contours L7 L1 L3 L0
properties part number "mountMount"
